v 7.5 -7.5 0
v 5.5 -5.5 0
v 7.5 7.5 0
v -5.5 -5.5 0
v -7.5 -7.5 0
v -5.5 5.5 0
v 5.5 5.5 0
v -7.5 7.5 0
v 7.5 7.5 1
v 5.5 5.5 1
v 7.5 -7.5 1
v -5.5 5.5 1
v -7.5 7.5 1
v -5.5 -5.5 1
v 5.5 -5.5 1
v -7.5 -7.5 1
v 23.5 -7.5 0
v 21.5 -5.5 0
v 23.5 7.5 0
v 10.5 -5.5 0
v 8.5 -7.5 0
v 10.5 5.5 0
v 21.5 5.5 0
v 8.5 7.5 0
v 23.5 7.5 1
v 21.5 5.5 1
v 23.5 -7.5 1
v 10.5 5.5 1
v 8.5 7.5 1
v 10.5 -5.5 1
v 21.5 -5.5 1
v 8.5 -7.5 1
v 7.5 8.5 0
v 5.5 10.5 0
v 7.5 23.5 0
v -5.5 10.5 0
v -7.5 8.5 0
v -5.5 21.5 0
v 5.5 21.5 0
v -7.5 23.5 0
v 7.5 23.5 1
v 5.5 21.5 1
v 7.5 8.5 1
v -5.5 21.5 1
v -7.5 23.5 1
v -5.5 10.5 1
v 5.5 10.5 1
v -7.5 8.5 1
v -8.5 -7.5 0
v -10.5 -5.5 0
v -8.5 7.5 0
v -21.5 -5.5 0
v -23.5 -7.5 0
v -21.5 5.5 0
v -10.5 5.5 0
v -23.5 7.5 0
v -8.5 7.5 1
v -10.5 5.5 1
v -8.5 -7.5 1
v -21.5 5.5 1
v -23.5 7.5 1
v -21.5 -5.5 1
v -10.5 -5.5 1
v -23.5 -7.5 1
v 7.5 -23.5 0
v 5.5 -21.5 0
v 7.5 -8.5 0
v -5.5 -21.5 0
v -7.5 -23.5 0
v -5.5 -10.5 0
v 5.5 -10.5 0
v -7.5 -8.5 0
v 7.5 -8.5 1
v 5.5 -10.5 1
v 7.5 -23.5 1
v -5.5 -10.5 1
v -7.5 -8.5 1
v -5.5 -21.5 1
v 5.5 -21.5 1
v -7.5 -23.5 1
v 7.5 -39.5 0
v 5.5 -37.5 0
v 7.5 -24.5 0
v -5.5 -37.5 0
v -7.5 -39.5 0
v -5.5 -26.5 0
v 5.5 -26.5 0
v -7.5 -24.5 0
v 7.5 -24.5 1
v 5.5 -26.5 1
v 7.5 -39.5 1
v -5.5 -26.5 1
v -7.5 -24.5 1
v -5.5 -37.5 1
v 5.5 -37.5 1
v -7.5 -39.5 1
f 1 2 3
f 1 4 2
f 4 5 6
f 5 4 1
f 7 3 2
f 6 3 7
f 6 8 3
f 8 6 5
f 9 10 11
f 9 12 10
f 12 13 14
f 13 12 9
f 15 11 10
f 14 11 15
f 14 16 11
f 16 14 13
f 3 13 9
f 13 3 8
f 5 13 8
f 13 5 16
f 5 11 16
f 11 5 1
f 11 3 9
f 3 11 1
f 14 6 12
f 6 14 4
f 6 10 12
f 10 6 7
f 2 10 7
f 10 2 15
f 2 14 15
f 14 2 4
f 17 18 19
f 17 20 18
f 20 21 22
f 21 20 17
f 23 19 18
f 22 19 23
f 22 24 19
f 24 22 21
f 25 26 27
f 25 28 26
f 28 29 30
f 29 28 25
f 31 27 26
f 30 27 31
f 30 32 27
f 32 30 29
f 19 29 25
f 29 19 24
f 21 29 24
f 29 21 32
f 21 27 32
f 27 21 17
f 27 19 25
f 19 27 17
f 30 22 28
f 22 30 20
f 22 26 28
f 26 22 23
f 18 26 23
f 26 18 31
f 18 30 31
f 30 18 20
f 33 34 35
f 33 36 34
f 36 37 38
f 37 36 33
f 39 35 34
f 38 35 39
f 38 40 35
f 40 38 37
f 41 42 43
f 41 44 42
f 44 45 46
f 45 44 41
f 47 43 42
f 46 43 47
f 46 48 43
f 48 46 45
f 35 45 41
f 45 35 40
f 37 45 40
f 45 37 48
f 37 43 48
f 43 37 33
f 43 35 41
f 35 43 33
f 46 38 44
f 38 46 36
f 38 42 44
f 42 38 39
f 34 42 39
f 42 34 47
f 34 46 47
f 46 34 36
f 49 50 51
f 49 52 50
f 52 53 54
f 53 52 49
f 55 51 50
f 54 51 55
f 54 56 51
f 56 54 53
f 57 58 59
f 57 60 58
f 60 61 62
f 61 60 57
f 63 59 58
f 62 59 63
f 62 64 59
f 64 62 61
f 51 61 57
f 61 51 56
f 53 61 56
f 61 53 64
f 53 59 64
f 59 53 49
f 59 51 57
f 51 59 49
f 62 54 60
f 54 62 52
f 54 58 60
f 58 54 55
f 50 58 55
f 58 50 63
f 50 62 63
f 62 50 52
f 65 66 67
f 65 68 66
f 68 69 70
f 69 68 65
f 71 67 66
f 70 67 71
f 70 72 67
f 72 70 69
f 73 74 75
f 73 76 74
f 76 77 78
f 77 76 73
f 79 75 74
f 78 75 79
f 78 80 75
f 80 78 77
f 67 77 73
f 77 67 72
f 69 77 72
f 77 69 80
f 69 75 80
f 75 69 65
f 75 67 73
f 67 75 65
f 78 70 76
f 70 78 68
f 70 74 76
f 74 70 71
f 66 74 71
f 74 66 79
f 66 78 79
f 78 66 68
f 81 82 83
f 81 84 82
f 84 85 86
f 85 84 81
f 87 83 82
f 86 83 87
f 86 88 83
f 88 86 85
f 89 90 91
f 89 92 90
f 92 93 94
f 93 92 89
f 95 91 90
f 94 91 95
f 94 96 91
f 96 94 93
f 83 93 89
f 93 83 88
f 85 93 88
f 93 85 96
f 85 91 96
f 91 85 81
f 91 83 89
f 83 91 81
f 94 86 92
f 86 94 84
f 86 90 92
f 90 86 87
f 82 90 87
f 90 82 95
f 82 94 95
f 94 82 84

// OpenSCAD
// Simple Unfolded Cube

render_part="unfolded_cube_map"; // unfolded_cube_map()

module frame_2d(size,th) {
  difference() {
    square(size,center=true);
    square(size-2*th,center=true);
  }
}

module unfolded_cube_map(size=15.0,spacing=1.0,wall_th=2.0,wall_h=1.0) {
  // Top face is center  face 0
  linear_extrude(height=wall_h) frame_2d(size,wall_th);
  if($children>0) child(0);
  // CCW from X+
  // face 1
  translate([size+spacing,0,0]) {
    linear_extrude(height=wall_h) frame_2d(size,wall_th);
    if($children==1) child(0);
    if($children>1) child(1);
  }
  // face 2
  translate([0,size+spacing,0]) {
    linear_extrude(height=wall_h) frame_2d(size,wall_th);
    if($children==1) child(0);
    if($children>2) child(2);
  }
  // face 3
  translate([-size-spacing,0,0]) {
    linear_extrude(height=wall_h) frame_2d(size,wall_th);
    if($children==1) child(0);
    if($children>3) child(3);
  }
  // face 4
  translate([0,-size-spacing,0]) {
    linear_extrude(height=wall_h) frame_2d(size,wall_th);
    if($children==1) child(0);
    if($children>4) child(4);
  }
  // Bottom face 5
  translate([0,-2*(size+spacing),0]) {
    linear_extrude(height=wall_h) frame_2d(size,wall_th);
    if($children==1) child(0);
    if($children>5) child(5);
  }
}

if(render_part=="unfolded_cube_map") {
  echo("Rendering unfolded_cube_map()...");
  unfolded_cube_map();
}
